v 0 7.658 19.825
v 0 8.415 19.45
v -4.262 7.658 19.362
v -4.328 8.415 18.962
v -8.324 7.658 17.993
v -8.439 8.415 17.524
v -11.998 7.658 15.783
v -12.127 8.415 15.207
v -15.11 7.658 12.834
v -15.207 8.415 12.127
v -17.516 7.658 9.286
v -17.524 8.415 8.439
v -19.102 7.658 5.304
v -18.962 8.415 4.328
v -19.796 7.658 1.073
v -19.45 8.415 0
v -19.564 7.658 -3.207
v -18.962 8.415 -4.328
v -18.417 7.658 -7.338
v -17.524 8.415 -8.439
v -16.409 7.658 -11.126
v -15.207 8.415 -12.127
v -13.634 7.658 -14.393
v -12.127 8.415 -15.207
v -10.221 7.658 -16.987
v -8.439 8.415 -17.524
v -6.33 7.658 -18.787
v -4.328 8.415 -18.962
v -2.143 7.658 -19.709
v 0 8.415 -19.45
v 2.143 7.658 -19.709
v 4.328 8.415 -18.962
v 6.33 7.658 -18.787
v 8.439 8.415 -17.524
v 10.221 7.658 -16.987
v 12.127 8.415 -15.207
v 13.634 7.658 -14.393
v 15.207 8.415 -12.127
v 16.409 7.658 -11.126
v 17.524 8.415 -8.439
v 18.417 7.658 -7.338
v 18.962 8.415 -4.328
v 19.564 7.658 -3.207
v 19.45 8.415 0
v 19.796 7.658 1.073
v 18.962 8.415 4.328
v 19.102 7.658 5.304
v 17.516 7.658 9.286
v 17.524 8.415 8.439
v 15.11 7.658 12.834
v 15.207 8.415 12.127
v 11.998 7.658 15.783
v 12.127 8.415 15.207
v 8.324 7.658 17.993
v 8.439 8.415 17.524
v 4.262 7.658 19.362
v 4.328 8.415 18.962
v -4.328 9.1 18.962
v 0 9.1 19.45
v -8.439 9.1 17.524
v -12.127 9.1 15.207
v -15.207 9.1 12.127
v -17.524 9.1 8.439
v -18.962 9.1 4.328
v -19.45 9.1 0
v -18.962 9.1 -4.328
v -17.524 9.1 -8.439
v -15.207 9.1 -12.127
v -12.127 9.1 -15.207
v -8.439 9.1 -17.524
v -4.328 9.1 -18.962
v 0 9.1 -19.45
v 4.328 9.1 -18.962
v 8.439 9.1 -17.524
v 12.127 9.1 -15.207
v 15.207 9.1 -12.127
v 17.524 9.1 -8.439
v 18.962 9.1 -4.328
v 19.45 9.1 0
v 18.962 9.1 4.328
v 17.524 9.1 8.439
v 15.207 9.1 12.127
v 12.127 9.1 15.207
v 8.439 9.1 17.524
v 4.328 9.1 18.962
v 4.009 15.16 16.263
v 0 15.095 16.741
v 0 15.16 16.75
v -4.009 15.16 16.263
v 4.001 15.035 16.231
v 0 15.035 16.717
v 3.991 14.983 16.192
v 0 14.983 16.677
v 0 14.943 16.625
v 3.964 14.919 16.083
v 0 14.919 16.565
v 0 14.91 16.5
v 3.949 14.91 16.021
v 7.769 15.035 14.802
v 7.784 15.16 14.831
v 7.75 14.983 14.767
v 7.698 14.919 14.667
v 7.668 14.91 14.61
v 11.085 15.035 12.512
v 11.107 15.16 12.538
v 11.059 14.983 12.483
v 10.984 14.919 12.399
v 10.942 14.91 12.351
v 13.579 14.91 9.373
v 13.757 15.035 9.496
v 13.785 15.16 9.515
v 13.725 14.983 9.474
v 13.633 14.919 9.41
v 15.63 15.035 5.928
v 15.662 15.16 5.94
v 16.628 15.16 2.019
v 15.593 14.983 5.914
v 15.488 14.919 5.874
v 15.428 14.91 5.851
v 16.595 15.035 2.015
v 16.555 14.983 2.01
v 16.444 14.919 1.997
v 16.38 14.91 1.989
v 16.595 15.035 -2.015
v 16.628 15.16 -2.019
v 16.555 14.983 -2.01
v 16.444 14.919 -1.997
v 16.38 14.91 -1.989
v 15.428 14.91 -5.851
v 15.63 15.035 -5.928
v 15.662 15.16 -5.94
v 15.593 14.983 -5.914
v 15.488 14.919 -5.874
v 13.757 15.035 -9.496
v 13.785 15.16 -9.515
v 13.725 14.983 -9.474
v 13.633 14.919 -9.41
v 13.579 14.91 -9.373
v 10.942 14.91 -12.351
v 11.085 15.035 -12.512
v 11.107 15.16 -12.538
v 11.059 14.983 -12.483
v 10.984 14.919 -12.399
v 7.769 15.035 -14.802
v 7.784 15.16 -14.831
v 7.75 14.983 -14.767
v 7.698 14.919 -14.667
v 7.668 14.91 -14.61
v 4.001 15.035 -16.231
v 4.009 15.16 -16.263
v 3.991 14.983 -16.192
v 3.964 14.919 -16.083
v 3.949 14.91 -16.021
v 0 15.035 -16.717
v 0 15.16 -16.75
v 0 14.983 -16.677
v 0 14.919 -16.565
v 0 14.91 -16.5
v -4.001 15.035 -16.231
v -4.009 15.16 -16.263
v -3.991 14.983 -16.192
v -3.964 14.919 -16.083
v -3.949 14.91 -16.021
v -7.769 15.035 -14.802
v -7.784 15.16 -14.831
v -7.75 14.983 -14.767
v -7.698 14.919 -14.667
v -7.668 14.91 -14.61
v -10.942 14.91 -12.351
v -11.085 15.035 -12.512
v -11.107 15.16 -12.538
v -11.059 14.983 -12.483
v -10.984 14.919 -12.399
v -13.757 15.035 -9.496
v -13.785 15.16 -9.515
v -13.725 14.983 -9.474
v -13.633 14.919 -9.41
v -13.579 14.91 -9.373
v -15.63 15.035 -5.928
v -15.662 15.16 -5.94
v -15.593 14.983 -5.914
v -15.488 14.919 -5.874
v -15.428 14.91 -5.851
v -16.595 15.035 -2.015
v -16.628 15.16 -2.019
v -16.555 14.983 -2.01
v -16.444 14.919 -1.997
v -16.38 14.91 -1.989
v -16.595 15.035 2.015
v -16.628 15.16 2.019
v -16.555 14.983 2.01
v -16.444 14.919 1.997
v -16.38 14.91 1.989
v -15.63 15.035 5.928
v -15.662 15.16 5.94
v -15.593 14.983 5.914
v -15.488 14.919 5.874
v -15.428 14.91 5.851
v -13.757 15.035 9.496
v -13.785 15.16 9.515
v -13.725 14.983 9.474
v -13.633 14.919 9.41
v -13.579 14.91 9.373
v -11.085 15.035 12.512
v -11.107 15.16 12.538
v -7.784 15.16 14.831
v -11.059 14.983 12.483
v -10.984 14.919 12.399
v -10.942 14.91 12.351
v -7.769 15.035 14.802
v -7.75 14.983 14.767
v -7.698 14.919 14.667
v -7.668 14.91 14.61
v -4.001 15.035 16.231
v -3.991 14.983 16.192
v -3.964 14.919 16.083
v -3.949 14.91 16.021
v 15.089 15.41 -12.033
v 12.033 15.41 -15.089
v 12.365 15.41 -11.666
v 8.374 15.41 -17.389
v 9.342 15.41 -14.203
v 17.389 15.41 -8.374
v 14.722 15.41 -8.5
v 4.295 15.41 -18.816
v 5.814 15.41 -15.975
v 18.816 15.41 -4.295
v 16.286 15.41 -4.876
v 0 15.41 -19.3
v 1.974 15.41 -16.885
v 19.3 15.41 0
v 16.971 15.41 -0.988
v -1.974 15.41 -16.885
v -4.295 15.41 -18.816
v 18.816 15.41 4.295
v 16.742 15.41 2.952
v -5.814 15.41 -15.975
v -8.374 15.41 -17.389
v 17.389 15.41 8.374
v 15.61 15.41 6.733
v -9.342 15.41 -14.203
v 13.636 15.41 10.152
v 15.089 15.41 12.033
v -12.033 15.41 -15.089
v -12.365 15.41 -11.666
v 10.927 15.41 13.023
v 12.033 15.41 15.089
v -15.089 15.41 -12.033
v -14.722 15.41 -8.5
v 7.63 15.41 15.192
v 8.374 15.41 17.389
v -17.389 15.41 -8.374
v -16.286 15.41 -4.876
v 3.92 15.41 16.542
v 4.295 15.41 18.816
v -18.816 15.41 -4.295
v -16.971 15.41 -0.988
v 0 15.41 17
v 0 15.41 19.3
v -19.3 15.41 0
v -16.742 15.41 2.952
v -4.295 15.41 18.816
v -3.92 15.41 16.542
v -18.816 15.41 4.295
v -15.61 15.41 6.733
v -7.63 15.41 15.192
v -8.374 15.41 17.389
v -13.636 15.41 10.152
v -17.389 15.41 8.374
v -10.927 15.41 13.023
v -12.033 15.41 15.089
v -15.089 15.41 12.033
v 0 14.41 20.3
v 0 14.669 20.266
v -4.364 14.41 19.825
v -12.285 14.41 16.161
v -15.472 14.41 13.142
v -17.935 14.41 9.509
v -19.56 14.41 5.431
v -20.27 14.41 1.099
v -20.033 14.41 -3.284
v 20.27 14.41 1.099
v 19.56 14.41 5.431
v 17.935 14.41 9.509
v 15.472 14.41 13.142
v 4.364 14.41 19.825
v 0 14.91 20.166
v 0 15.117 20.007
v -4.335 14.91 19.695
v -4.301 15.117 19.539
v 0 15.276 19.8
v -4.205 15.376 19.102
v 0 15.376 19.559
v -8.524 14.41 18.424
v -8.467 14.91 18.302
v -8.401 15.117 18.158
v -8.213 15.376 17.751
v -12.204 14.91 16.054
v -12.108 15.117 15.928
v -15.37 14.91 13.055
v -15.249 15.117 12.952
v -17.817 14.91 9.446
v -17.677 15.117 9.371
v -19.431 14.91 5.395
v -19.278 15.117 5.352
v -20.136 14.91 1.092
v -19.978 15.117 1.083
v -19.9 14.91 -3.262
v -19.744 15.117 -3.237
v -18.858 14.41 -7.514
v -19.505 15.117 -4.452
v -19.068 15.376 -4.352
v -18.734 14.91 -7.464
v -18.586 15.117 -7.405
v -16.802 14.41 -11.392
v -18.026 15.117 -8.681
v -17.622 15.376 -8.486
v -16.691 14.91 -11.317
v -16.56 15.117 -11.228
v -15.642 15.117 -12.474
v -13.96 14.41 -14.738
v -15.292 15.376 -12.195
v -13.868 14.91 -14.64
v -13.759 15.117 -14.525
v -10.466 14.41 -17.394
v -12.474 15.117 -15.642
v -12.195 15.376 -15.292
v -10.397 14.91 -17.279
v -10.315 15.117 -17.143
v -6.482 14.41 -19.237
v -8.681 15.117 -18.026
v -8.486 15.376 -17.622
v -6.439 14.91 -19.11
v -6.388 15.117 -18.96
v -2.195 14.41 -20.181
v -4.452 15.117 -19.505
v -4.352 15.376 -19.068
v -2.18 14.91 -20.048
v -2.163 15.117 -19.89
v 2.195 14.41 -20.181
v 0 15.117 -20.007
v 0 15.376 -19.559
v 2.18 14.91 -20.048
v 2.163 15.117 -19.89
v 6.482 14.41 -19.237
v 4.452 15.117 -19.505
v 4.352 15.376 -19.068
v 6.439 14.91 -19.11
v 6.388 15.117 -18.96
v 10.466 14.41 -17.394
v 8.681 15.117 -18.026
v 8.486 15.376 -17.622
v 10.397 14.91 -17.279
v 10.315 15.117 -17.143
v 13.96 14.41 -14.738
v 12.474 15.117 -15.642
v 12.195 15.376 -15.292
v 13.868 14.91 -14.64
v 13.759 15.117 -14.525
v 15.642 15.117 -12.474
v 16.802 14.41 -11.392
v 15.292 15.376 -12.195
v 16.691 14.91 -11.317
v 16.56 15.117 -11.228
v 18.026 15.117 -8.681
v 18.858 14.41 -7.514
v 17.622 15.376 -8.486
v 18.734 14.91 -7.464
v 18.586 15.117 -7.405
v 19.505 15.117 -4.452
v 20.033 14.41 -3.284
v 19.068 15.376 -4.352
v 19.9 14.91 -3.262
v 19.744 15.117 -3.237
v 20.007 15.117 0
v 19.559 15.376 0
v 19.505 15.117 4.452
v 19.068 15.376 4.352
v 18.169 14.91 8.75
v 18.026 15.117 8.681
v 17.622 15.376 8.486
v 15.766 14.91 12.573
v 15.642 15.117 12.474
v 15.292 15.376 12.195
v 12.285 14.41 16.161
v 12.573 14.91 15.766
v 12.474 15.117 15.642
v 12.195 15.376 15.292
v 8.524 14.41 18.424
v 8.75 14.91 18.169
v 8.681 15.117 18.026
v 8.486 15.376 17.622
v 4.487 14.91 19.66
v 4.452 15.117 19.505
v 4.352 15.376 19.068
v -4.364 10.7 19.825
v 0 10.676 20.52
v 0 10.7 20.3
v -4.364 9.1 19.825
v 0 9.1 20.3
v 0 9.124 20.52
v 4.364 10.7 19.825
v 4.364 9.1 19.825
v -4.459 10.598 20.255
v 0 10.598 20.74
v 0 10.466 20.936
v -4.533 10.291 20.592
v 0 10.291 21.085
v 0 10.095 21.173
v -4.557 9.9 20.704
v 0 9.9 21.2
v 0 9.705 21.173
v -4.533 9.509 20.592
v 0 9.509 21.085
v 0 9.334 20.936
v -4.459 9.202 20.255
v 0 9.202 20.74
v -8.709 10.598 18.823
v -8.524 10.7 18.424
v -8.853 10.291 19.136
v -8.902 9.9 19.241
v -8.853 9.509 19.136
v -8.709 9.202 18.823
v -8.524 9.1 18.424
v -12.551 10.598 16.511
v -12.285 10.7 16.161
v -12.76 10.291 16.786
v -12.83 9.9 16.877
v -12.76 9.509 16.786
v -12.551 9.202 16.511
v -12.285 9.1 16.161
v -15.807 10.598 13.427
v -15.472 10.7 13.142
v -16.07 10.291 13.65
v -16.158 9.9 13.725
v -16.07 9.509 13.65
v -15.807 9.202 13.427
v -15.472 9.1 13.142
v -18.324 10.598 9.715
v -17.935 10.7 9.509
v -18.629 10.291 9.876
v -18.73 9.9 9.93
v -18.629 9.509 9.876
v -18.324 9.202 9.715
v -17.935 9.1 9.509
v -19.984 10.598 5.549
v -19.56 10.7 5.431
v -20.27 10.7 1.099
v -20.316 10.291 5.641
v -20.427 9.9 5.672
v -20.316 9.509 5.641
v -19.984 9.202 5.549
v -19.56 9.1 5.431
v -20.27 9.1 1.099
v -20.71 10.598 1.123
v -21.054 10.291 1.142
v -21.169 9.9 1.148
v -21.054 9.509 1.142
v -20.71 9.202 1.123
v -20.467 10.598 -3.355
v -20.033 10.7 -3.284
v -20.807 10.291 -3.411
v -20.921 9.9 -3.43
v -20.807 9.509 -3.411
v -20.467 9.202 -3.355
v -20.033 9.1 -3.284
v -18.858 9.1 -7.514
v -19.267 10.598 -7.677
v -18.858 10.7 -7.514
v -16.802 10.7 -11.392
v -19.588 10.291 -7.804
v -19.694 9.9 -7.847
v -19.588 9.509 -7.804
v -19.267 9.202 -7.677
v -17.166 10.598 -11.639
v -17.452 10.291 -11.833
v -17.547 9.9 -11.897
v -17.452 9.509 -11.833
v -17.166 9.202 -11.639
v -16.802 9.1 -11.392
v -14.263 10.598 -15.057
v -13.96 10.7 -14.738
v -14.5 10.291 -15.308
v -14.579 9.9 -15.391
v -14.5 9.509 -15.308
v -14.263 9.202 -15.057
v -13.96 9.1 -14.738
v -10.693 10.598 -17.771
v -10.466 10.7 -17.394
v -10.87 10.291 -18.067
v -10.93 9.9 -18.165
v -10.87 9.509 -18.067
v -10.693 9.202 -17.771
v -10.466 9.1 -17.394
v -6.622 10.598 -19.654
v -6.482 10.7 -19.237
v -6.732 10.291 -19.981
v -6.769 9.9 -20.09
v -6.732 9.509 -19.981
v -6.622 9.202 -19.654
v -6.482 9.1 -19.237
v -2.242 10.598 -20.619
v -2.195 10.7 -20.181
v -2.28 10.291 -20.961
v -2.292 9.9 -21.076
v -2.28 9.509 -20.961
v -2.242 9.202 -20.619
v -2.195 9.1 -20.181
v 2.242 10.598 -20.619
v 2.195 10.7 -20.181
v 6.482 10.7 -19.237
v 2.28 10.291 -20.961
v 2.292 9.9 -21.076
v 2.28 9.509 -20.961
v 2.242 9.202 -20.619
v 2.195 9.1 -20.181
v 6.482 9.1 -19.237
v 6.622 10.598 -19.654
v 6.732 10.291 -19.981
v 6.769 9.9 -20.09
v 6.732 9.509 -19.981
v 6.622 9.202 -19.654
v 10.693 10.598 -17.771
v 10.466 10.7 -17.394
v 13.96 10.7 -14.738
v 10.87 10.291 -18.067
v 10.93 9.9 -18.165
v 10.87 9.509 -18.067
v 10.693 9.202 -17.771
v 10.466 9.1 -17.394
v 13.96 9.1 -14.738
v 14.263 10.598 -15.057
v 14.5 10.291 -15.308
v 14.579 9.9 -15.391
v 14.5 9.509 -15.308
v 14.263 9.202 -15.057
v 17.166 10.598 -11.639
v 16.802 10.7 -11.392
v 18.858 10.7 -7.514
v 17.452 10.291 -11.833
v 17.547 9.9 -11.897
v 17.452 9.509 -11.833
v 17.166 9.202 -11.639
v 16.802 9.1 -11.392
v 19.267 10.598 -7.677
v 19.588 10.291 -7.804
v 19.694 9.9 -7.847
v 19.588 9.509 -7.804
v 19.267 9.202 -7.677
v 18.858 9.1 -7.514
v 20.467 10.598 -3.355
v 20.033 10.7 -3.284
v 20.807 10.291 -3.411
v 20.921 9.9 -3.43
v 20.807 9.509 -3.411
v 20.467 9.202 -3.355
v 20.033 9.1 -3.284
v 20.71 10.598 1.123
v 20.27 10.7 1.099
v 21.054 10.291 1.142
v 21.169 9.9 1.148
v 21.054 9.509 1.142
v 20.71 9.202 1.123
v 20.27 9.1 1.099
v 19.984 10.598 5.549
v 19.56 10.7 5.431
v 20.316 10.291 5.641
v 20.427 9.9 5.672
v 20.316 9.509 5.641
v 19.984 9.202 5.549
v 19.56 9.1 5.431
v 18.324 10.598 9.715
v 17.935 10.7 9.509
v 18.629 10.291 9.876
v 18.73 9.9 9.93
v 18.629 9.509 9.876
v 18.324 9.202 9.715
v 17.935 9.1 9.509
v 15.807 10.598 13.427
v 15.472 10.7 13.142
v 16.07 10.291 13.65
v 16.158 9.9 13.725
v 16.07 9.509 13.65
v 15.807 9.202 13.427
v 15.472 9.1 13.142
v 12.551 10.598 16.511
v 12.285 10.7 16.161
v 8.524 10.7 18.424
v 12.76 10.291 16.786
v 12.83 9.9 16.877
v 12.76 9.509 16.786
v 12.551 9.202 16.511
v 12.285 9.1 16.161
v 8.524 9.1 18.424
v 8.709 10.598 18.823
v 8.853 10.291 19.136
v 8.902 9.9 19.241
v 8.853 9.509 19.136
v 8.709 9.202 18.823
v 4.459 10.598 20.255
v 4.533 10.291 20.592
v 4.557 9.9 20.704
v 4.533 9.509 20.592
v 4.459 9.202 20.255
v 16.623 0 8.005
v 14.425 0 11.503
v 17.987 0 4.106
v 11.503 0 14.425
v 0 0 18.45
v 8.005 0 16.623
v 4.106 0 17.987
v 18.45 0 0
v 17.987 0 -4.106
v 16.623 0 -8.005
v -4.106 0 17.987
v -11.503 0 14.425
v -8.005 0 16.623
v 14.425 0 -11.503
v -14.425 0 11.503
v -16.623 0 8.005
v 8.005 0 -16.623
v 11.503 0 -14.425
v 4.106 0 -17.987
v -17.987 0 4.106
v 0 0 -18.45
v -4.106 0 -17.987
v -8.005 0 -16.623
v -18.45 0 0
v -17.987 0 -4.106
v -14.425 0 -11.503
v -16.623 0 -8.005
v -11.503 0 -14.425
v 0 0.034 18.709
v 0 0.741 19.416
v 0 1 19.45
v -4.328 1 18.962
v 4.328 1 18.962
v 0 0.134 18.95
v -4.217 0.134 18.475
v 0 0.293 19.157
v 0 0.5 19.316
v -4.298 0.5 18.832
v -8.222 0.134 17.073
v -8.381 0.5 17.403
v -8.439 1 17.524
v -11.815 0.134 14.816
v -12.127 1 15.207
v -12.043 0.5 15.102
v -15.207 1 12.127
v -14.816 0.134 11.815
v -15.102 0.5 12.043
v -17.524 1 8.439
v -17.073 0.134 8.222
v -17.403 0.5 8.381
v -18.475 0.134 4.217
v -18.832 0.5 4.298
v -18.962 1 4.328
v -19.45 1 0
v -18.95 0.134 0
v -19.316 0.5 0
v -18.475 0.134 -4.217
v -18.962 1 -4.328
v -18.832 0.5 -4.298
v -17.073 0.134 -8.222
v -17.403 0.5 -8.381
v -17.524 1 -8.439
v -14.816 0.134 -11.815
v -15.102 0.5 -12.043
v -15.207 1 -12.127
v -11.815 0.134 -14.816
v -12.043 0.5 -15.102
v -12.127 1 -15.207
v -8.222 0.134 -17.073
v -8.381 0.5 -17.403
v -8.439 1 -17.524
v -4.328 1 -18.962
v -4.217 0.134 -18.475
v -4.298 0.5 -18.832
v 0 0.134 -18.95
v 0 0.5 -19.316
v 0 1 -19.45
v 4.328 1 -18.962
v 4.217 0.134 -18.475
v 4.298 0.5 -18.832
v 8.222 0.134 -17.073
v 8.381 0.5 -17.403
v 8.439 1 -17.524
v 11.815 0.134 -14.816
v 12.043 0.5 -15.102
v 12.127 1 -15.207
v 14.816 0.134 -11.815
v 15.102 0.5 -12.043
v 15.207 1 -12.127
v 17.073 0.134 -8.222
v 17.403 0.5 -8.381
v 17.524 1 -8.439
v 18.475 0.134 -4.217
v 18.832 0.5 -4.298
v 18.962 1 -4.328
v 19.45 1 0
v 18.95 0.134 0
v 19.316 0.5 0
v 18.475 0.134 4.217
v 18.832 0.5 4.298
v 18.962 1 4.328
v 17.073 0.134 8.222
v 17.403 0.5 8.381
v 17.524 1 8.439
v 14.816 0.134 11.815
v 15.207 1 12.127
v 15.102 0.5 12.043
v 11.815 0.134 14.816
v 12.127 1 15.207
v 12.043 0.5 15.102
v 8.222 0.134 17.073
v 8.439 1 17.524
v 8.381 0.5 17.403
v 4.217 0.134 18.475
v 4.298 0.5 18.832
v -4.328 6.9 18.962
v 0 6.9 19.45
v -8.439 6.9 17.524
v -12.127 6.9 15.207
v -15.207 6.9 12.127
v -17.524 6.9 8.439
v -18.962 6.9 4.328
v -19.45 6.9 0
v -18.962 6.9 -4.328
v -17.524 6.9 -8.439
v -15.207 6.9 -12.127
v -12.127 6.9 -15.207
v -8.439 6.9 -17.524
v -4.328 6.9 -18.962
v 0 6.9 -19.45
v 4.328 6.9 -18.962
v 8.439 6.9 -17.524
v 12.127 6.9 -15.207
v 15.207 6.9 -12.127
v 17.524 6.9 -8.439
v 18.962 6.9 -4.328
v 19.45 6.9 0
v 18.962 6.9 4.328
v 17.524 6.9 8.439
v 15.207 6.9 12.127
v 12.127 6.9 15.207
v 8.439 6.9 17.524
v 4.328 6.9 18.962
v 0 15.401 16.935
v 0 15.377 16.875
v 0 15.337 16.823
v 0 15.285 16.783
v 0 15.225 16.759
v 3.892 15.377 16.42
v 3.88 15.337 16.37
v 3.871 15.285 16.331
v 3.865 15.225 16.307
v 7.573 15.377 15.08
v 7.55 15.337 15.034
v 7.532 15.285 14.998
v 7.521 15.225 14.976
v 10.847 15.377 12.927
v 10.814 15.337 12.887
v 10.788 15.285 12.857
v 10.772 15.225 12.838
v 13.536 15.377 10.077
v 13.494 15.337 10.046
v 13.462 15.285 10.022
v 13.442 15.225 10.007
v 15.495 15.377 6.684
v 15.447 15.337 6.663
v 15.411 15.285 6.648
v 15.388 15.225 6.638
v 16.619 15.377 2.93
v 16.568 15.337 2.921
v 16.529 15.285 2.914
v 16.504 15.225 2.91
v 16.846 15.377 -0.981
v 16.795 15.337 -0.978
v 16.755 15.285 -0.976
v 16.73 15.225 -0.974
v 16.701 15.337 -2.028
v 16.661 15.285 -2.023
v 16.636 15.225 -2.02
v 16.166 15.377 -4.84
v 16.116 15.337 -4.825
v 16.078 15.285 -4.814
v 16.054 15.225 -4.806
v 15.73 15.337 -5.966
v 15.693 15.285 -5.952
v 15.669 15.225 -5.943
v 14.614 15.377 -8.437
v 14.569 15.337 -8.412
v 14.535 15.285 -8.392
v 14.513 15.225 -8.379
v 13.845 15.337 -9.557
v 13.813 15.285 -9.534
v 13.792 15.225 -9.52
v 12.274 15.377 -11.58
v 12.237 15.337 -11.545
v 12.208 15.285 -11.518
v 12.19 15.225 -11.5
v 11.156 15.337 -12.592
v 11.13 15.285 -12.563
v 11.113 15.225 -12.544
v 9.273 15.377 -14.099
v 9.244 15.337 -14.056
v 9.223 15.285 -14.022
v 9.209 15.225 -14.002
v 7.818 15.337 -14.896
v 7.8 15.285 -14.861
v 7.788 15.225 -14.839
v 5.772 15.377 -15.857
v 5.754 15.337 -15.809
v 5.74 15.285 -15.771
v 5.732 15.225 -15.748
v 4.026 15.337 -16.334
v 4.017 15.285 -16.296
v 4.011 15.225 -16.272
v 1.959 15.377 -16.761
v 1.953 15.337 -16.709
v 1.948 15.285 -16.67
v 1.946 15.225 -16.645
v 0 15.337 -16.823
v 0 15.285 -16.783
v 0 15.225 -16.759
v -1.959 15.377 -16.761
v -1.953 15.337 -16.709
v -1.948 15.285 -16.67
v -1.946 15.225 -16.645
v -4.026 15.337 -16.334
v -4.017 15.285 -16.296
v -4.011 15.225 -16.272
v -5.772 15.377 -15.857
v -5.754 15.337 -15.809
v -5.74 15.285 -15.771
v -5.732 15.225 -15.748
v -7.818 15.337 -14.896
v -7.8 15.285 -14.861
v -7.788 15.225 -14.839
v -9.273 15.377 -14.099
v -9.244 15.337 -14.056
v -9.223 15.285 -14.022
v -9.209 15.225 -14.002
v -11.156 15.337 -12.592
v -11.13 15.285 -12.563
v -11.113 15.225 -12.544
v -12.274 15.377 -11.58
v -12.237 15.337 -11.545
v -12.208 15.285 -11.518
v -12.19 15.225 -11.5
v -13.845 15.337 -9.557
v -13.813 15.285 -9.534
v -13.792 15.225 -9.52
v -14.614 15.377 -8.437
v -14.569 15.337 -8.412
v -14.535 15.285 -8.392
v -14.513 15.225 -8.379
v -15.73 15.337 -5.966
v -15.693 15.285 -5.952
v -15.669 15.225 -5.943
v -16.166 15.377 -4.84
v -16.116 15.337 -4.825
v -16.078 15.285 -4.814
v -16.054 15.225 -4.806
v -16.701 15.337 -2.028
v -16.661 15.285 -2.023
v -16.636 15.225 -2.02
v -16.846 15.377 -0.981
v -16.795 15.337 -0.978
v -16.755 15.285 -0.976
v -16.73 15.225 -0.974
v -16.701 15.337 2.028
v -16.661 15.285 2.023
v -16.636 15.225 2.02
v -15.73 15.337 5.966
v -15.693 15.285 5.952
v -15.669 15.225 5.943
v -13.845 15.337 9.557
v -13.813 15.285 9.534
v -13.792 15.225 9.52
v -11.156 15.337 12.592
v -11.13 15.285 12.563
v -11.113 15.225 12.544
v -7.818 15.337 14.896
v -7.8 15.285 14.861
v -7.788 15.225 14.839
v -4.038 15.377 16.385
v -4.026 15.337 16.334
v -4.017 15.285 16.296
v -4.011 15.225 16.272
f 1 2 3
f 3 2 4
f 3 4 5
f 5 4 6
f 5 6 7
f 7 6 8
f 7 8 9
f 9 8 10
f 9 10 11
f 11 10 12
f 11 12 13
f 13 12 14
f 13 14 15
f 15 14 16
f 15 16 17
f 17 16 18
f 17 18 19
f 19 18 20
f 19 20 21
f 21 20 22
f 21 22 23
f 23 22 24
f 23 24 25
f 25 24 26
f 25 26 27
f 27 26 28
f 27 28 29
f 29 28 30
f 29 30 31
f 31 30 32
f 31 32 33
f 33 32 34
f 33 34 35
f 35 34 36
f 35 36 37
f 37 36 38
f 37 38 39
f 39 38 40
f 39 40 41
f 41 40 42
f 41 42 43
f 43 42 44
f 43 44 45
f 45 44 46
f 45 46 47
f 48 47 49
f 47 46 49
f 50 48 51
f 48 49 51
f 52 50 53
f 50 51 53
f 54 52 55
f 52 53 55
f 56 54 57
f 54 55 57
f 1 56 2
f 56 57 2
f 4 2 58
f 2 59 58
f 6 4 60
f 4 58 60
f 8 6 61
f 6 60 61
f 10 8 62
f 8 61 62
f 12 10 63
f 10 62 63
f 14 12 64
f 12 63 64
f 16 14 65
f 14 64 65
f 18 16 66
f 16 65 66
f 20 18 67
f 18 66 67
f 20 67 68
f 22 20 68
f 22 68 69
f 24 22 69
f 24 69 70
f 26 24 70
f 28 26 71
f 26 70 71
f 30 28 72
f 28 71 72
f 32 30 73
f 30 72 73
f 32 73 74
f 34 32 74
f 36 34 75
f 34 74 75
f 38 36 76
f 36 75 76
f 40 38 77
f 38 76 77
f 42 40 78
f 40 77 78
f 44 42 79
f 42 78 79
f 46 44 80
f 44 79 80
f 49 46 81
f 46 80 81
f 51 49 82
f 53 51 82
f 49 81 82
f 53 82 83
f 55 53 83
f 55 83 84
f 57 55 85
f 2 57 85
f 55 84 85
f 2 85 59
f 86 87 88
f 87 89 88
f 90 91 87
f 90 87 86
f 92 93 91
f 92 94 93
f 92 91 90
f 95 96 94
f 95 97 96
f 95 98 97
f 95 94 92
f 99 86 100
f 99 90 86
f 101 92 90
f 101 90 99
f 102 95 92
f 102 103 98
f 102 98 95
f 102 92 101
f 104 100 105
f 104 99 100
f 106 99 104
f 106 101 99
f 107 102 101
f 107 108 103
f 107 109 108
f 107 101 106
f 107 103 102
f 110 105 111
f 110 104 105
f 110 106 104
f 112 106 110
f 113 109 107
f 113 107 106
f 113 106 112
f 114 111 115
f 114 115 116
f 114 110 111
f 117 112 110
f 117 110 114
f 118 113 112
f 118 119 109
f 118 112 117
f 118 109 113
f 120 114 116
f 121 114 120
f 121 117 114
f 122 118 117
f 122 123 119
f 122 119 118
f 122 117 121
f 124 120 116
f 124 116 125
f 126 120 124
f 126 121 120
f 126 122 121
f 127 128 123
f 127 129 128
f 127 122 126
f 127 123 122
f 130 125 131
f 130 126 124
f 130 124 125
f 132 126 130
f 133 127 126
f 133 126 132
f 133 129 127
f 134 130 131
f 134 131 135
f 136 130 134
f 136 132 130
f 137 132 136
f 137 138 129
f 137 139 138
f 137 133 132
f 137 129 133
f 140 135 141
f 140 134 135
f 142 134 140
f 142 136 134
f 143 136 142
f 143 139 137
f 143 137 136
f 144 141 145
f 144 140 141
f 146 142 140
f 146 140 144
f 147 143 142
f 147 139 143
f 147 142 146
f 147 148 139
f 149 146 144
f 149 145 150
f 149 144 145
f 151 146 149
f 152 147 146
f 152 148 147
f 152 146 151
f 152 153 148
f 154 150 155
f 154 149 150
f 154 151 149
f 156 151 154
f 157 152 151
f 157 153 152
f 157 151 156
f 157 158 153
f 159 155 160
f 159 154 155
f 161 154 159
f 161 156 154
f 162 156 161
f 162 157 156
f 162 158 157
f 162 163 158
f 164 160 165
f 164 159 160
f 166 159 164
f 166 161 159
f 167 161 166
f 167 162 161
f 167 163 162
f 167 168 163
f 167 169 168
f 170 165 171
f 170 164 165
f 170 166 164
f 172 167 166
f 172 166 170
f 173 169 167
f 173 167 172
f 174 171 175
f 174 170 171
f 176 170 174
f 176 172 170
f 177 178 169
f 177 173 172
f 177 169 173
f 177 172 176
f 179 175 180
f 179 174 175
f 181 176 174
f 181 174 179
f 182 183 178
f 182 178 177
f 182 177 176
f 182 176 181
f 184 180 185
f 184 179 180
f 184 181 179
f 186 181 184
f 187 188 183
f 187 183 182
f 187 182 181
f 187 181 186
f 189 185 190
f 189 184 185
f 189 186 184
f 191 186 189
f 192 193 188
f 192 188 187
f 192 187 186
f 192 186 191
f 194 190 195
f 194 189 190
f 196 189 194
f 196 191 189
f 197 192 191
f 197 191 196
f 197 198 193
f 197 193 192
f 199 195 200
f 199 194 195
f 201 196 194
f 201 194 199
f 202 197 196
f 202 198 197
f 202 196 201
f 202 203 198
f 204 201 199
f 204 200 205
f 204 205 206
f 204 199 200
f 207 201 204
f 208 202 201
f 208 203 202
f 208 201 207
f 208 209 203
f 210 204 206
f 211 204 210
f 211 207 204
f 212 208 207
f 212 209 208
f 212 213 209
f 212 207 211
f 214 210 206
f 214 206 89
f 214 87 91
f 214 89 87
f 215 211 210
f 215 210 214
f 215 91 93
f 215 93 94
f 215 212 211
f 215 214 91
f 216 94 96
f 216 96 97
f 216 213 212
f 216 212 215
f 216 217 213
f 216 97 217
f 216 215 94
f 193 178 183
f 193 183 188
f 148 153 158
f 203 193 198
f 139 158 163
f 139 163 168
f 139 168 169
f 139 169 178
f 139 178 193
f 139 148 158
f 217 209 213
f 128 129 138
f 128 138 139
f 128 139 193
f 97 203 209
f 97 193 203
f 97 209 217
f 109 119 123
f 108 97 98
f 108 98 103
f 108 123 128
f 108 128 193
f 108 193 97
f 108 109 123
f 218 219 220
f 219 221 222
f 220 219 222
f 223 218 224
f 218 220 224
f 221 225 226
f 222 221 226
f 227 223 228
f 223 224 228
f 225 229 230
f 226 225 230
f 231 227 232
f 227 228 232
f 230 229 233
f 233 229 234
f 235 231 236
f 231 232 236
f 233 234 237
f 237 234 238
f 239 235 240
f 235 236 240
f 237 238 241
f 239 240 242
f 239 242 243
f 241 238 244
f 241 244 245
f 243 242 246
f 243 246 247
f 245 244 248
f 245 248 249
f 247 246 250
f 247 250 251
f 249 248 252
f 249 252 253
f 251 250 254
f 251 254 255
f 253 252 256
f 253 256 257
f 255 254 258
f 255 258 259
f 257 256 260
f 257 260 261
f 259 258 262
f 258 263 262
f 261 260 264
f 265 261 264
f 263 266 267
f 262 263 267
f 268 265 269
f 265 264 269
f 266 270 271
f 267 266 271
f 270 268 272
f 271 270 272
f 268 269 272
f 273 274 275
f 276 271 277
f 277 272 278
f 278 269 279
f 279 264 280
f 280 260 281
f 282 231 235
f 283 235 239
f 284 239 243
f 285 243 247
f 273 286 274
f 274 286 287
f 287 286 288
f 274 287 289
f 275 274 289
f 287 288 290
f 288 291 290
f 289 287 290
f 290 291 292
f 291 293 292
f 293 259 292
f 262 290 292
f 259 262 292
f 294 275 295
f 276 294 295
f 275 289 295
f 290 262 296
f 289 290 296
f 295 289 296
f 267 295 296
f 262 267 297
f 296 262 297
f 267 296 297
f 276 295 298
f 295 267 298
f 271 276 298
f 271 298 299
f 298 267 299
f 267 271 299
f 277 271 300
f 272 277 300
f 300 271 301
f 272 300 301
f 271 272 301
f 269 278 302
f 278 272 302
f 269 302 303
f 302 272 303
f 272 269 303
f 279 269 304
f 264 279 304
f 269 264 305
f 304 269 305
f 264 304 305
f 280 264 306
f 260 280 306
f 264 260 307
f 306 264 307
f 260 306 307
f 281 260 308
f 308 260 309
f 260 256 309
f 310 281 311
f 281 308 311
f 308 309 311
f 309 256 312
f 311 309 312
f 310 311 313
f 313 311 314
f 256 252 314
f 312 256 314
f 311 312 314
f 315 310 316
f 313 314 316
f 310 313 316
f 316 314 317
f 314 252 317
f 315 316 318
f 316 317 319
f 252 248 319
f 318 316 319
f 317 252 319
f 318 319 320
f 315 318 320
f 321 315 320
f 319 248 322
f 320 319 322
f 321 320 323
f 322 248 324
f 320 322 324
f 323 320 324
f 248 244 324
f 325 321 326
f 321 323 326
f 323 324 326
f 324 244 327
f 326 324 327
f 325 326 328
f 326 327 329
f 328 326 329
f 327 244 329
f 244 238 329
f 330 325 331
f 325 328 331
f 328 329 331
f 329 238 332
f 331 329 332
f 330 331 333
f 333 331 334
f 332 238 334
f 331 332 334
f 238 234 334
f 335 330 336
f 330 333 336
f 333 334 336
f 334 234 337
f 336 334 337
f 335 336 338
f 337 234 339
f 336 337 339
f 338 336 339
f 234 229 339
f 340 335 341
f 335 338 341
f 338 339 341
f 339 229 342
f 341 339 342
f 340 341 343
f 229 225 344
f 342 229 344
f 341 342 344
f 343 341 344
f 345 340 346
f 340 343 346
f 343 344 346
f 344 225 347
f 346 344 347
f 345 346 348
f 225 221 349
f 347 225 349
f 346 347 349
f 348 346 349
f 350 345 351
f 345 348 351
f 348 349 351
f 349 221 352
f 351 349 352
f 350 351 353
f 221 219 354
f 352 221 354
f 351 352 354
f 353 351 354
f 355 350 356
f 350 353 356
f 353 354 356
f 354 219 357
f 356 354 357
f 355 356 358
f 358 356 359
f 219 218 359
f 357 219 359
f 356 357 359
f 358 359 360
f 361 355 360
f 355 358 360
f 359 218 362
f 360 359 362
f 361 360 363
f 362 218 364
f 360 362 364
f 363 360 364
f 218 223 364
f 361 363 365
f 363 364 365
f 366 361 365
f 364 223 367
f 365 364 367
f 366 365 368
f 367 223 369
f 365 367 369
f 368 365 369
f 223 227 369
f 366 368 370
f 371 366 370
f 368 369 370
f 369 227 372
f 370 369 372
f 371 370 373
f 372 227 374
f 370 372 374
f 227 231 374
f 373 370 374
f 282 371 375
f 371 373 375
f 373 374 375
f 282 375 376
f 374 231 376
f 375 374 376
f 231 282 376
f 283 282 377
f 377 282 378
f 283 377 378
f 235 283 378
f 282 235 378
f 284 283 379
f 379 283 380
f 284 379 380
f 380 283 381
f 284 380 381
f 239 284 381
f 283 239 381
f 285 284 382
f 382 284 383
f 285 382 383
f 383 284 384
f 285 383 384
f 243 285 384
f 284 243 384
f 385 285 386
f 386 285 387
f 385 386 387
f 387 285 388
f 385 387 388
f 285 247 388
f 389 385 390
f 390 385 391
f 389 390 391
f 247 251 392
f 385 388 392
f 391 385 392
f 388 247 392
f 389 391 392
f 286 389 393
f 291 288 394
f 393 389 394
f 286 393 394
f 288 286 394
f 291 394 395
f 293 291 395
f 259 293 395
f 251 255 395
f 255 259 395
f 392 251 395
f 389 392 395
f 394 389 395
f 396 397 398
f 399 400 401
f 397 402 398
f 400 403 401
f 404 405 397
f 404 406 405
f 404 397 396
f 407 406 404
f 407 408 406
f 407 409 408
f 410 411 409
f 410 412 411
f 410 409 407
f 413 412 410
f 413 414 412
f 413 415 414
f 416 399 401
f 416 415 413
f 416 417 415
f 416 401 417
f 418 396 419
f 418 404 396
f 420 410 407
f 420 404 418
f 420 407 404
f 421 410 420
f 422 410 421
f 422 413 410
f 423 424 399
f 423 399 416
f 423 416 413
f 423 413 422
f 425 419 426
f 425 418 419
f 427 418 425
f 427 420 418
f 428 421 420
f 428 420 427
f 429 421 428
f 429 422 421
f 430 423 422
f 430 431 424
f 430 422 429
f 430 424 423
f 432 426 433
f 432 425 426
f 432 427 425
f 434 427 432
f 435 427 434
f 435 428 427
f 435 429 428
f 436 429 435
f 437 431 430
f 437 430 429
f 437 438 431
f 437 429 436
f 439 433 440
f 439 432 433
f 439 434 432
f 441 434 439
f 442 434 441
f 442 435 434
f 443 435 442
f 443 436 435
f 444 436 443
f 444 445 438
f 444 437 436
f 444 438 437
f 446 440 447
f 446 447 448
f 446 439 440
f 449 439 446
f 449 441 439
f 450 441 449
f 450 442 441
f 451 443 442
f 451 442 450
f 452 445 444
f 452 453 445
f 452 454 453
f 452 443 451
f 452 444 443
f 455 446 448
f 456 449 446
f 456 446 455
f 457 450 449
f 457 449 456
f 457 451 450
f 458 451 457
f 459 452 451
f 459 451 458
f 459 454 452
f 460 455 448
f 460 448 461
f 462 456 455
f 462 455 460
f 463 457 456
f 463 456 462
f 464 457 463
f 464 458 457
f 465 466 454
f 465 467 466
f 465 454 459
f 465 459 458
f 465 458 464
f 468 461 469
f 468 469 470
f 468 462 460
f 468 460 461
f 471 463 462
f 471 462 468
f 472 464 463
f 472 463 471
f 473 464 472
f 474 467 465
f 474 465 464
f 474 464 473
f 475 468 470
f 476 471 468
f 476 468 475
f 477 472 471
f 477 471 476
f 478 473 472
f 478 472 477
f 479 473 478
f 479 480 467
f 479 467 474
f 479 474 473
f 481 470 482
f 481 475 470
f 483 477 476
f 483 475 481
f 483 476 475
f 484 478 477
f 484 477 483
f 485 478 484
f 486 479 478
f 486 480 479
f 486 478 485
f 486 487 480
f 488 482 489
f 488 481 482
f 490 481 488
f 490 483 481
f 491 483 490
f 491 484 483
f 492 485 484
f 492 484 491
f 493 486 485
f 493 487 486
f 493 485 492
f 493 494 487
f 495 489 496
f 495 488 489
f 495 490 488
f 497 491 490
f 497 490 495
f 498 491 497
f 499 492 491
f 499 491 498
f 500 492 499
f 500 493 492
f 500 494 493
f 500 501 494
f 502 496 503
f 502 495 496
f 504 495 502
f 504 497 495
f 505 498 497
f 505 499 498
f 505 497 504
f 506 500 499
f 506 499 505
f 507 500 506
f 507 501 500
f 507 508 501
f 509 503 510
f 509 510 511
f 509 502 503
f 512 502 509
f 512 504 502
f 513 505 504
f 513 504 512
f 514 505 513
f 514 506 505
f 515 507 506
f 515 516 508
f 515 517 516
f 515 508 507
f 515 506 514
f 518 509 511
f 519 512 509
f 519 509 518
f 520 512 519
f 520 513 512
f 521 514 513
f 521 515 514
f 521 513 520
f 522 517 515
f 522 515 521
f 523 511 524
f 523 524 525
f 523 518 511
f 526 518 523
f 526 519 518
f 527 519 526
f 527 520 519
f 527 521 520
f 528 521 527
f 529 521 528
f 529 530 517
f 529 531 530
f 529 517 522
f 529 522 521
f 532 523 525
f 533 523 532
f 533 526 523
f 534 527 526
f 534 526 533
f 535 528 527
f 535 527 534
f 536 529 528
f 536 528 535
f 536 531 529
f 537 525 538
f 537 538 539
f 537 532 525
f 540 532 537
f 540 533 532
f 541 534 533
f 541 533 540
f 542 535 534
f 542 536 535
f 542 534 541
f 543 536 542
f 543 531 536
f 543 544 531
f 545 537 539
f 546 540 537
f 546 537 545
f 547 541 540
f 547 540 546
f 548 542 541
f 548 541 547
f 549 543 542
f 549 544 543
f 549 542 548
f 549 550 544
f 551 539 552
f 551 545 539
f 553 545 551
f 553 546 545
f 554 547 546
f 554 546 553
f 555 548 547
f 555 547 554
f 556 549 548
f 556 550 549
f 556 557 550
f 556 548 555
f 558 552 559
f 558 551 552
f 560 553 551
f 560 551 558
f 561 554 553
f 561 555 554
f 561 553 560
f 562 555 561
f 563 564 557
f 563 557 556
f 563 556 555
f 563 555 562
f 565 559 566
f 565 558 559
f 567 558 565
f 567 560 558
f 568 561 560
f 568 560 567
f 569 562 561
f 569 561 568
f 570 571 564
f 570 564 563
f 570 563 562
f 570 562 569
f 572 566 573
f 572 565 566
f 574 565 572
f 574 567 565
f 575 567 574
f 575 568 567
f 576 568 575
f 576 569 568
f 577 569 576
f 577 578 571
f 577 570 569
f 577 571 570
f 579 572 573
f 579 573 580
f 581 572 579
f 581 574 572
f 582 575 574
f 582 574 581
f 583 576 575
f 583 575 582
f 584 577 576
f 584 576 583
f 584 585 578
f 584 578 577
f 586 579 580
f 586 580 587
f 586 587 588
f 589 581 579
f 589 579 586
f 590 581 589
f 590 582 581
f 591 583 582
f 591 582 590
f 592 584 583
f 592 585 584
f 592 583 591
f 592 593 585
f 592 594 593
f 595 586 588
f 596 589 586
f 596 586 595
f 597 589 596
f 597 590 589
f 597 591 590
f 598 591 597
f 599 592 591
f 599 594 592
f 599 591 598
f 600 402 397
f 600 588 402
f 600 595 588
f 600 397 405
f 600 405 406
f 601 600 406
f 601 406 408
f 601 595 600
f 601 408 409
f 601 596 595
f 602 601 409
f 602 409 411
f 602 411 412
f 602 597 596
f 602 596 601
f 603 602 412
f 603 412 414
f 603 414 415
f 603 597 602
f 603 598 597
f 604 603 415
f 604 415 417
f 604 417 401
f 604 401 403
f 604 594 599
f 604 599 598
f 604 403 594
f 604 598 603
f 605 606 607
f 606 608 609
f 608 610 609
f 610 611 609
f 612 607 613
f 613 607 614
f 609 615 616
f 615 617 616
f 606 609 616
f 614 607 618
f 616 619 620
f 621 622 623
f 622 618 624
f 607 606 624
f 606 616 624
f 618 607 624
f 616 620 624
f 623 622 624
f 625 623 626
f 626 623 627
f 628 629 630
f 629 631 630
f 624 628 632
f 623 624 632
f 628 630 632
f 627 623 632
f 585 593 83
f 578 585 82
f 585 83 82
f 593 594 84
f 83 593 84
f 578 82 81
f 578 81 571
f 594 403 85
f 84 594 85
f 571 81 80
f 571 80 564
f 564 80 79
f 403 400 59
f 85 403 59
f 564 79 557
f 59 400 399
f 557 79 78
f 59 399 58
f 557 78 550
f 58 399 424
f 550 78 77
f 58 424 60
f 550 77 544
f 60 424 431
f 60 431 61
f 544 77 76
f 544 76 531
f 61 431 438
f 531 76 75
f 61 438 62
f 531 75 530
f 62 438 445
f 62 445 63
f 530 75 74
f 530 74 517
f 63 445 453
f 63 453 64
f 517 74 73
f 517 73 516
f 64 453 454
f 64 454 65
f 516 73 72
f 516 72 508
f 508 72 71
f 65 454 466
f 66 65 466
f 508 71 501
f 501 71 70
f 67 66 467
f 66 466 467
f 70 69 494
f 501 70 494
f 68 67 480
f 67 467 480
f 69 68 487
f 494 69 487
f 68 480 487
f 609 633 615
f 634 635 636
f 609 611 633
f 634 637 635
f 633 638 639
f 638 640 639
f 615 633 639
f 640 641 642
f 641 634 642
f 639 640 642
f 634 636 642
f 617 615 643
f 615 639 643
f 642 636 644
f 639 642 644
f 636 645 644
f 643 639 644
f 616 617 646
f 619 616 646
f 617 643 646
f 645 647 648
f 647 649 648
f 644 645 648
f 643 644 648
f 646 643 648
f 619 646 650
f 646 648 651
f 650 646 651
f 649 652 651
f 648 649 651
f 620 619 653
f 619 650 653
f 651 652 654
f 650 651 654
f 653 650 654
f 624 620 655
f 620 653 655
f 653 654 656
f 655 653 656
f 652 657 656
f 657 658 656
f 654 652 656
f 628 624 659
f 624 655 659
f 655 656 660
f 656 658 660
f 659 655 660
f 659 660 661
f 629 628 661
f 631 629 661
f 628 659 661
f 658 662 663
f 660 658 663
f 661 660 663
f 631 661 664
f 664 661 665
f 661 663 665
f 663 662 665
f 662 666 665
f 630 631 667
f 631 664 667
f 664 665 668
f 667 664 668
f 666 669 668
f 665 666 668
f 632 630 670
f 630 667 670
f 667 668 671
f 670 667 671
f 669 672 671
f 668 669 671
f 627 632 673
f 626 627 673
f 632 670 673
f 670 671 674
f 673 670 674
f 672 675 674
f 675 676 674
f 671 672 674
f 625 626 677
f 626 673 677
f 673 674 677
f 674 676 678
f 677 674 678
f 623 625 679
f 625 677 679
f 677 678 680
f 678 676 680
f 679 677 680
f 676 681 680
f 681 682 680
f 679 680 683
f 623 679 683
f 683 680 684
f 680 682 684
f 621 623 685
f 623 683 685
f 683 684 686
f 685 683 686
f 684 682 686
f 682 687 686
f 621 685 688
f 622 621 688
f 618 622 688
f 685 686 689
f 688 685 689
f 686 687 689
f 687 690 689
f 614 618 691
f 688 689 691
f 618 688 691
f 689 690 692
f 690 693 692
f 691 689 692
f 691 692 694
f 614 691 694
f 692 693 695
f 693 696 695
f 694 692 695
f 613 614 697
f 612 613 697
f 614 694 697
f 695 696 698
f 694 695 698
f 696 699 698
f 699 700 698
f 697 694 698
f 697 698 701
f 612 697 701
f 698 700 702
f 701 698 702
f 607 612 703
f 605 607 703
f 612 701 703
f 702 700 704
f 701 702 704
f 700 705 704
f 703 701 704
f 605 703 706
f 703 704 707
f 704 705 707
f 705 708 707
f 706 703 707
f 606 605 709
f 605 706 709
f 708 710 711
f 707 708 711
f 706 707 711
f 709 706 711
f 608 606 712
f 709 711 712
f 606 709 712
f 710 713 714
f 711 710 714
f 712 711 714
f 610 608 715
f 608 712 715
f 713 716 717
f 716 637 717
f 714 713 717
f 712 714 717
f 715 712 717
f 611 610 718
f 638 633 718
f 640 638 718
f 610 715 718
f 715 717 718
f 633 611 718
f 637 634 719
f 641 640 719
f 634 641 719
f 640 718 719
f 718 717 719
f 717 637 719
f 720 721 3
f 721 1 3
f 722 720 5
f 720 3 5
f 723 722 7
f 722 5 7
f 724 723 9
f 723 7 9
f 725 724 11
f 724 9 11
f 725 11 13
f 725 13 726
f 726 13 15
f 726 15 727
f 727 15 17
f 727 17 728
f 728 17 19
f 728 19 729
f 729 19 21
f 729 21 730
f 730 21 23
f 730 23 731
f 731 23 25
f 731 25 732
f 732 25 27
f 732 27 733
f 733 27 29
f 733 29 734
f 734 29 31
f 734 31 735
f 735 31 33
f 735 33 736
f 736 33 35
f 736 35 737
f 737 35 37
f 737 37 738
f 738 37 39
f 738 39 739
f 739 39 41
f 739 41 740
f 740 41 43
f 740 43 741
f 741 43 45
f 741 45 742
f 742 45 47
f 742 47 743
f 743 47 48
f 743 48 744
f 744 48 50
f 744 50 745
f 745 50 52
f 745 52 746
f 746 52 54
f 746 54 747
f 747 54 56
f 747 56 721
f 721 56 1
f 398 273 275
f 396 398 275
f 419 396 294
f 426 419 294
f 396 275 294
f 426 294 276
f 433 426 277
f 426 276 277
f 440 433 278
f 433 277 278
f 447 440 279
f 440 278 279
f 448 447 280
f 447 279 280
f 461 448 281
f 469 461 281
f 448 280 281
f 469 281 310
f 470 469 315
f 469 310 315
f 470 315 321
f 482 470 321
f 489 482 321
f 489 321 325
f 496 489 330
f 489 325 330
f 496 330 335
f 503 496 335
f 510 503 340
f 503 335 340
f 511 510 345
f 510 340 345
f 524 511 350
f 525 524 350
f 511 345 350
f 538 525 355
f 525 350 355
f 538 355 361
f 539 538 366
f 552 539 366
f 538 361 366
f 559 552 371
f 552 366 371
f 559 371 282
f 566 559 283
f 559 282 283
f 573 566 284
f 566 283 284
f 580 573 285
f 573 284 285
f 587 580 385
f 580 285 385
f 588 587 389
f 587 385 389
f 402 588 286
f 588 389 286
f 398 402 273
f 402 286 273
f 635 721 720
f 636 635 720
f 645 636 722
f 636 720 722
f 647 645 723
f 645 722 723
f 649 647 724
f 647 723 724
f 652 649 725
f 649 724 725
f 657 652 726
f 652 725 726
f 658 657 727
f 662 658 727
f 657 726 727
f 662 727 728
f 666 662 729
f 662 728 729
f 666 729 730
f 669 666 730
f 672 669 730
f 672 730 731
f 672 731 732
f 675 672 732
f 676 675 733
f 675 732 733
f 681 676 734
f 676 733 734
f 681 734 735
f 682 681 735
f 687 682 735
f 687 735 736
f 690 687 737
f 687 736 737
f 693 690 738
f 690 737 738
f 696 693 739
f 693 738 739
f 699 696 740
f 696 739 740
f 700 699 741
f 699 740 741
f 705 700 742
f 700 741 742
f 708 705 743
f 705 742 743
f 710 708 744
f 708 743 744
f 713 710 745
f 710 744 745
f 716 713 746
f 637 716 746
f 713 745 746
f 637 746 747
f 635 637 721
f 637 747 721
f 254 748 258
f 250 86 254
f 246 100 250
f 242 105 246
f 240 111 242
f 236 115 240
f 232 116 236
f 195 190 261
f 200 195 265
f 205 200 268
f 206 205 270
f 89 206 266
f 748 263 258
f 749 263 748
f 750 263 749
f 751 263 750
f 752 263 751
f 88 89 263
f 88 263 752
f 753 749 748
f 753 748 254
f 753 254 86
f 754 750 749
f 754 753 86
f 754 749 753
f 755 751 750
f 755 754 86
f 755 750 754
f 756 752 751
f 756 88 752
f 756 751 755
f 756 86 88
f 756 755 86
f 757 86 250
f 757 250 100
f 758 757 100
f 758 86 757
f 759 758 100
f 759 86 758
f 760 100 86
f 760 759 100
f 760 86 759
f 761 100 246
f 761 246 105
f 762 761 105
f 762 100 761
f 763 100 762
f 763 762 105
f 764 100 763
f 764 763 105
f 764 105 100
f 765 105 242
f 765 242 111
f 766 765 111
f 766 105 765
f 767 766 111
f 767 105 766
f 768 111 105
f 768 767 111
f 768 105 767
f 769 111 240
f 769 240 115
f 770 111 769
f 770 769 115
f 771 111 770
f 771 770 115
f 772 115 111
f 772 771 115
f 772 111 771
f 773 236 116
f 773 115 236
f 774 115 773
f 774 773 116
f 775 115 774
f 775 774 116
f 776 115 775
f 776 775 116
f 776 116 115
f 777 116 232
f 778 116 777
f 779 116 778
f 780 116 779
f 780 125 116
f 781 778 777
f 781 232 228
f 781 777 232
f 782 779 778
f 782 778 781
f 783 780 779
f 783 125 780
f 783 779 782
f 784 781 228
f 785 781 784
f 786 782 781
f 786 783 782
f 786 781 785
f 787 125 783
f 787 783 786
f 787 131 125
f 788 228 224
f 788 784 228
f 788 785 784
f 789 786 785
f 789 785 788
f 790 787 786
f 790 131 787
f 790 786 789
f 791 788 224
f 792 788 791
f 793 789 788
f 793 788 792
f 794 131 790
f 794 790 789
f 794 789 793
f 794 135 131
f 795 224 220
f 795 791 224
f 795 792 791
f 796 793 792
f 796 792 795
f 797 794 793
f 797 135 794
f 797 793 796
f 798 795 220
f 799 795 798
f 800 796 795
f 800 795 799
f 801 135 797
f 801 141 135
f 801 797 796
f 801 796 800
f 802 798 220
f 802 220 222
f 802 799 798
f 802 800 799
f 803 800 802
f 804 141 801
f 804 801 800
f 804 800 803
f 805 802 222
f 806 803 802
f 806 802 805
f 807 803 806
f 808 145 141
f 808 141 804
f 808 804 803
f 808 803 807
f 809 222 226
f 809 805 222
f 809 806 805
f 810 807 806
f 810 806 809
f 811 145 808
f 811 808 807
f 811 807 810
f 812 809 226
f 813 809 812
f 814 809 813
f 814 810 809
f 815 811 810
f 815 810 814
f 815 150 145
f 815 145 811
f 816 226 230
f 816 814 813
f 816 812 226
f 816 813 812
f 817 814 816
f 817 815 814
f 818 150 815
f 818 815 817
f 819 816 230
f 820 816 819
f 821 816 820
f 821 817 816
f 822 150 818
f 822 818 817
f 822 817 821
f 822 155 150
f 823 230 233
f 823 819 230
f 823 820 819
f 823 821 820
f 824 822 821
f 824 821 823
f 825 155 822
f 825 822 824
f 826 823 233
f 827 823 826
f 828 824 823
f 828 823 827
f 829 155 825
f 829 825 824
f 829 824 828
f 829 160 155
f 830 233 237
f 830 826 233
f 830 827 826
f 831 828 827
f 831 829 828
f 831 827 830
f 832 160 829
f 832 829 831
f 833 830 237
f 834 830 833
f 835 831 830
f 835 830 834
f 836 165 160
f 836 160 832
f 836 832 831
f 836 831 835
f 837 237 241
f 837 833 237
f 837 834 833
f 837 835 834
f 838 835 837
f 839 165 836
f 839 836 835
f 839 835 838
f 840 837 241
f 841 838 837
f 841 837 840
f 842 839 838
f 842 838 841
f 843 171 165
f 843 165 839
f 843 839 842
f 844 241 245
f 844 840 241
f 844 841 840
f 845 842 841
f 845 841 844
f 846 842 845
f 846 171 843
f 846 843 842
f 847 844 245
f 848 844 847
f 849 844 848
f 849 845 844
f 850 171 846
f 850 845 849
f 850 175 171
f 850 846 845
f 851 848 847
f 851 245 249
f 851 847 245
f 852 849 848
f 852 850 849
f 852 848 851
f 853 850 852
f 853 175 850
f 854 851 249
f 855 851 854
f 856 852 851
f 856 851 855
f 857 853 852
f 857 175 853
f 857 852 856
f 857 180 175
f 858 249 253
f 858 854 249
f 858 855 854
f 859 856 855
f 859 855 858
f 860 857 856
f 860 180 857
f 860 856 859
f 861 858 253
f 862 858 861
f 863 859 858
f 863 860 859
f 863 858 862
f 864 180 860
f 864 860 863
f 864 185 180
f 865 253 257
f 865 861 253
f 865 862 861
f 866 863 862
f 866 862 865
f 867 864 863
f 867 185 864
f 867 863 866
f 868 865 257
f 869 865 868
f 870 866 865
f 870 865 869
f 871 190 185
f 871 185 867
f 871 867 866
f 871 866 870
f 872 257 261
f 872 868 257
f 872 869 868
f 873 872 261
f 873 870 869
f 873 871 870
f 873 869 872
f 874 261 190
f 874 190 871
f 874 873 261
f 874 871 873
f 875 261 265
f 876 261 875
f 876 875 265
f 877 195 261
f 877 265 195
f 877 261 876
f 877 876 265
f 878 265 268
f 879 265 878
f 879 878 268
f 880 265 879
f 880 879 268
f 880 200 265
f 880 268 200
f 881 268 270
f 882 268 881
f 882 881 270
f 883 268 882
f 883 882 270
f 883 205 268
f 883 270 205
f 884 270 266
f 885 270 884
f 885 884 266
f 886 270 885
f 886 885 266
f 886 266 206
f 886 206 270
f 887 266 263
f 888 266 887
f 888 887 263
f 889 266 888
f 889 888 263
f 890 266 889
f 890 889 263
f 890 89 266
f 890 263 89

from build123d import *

# Parameters (mm, degrees)
SKETCH2_R          = 16.75
CUT_EXTRUDE1_DEPTH = 0.5
FILLET1_R          = 1
FILLET2_R          = 0.25


with BuildPart() as part:
    # Sketch1 → Revolve1 (revolve)
    with BuildSketch(Plane.XY, mode=Mode.PRIVATE) as revolve1_sk:
        with BuildLine():
            Line((0, 0), (-19.45, 0))
            Line((-19.45, 0), (-19.45, 6.9))
            Line((-19.45, 6.9), (-19.825, 7.657541722))
            Line((-19.825, 7.657541722), (-19.45, 8.415083444))
            Line((-19.45, 8.415083444), (-19.45, 9.1))
            Line((-19.45, 9.1), (-20.3, 9.1))
            add(Edge.make_bspline(
                [(-20.3, 10.7), (-21.2, 10.7), (-21.2, 9.9), (-21.2, 9.1), (-20.3, 9.1)],
                knots=[4.71238898, 4.71238898, 4.71238898, 6.283185307, 6.283185307, 7.853981634, 7.853981634, 7.853981634], degree=2, weights=[1, 0.707106781, 1, 0.707106781, 1]))
            Line((-20.3, 10.7), (-20.3, 15.41))
            Line((-20.3, 15.41), (0, 15.41))
            Line((0, 15.41), (0, 0))
        make_face()
    revolve(revolve1_sk.sketch.rotate(Axis((0, 24.52235385, 0), (0, -1, 0)), 270), axis=Axis((0, 24.52235385, 0), (0, -1, 0)))

    # Sketch2 → Cut-Extrude1 (cut)
    with BuildSketch(Plane(origin=(0, 15.41, 0), x_dir=(1, 0, 0), z_dir=(0, 1, 0))):
        with Locations(Location((0, 0, 0), (0, 0, 270))):
            Circle(SKETCH2_R)
    extrude(amount=-CUT_EXTRUDE1_DEPTH, mode=Mode.SUBTRACT)

    # Fillet1
    fillet1_edges = [part.edges().sort_by_distance(p)[0] for p in [
        (0, 15.41, -20.3),
        (0, 0, -19.45),
    ]]
    fillet(fillet1_edges, radius=FILLET1_R)

    # Fillet2
    fillet2_edges = [part.edges().sort_by_distance(p)[0] for p in [
        (0, 14.91, -16.75),
        (0, 15.41, -16.75),
    ]]
    fillet(fillet2_edges, radius=FILLET2_R - 0.0001)  # a hair under: the kernel refuses the full size


solid = part.part
